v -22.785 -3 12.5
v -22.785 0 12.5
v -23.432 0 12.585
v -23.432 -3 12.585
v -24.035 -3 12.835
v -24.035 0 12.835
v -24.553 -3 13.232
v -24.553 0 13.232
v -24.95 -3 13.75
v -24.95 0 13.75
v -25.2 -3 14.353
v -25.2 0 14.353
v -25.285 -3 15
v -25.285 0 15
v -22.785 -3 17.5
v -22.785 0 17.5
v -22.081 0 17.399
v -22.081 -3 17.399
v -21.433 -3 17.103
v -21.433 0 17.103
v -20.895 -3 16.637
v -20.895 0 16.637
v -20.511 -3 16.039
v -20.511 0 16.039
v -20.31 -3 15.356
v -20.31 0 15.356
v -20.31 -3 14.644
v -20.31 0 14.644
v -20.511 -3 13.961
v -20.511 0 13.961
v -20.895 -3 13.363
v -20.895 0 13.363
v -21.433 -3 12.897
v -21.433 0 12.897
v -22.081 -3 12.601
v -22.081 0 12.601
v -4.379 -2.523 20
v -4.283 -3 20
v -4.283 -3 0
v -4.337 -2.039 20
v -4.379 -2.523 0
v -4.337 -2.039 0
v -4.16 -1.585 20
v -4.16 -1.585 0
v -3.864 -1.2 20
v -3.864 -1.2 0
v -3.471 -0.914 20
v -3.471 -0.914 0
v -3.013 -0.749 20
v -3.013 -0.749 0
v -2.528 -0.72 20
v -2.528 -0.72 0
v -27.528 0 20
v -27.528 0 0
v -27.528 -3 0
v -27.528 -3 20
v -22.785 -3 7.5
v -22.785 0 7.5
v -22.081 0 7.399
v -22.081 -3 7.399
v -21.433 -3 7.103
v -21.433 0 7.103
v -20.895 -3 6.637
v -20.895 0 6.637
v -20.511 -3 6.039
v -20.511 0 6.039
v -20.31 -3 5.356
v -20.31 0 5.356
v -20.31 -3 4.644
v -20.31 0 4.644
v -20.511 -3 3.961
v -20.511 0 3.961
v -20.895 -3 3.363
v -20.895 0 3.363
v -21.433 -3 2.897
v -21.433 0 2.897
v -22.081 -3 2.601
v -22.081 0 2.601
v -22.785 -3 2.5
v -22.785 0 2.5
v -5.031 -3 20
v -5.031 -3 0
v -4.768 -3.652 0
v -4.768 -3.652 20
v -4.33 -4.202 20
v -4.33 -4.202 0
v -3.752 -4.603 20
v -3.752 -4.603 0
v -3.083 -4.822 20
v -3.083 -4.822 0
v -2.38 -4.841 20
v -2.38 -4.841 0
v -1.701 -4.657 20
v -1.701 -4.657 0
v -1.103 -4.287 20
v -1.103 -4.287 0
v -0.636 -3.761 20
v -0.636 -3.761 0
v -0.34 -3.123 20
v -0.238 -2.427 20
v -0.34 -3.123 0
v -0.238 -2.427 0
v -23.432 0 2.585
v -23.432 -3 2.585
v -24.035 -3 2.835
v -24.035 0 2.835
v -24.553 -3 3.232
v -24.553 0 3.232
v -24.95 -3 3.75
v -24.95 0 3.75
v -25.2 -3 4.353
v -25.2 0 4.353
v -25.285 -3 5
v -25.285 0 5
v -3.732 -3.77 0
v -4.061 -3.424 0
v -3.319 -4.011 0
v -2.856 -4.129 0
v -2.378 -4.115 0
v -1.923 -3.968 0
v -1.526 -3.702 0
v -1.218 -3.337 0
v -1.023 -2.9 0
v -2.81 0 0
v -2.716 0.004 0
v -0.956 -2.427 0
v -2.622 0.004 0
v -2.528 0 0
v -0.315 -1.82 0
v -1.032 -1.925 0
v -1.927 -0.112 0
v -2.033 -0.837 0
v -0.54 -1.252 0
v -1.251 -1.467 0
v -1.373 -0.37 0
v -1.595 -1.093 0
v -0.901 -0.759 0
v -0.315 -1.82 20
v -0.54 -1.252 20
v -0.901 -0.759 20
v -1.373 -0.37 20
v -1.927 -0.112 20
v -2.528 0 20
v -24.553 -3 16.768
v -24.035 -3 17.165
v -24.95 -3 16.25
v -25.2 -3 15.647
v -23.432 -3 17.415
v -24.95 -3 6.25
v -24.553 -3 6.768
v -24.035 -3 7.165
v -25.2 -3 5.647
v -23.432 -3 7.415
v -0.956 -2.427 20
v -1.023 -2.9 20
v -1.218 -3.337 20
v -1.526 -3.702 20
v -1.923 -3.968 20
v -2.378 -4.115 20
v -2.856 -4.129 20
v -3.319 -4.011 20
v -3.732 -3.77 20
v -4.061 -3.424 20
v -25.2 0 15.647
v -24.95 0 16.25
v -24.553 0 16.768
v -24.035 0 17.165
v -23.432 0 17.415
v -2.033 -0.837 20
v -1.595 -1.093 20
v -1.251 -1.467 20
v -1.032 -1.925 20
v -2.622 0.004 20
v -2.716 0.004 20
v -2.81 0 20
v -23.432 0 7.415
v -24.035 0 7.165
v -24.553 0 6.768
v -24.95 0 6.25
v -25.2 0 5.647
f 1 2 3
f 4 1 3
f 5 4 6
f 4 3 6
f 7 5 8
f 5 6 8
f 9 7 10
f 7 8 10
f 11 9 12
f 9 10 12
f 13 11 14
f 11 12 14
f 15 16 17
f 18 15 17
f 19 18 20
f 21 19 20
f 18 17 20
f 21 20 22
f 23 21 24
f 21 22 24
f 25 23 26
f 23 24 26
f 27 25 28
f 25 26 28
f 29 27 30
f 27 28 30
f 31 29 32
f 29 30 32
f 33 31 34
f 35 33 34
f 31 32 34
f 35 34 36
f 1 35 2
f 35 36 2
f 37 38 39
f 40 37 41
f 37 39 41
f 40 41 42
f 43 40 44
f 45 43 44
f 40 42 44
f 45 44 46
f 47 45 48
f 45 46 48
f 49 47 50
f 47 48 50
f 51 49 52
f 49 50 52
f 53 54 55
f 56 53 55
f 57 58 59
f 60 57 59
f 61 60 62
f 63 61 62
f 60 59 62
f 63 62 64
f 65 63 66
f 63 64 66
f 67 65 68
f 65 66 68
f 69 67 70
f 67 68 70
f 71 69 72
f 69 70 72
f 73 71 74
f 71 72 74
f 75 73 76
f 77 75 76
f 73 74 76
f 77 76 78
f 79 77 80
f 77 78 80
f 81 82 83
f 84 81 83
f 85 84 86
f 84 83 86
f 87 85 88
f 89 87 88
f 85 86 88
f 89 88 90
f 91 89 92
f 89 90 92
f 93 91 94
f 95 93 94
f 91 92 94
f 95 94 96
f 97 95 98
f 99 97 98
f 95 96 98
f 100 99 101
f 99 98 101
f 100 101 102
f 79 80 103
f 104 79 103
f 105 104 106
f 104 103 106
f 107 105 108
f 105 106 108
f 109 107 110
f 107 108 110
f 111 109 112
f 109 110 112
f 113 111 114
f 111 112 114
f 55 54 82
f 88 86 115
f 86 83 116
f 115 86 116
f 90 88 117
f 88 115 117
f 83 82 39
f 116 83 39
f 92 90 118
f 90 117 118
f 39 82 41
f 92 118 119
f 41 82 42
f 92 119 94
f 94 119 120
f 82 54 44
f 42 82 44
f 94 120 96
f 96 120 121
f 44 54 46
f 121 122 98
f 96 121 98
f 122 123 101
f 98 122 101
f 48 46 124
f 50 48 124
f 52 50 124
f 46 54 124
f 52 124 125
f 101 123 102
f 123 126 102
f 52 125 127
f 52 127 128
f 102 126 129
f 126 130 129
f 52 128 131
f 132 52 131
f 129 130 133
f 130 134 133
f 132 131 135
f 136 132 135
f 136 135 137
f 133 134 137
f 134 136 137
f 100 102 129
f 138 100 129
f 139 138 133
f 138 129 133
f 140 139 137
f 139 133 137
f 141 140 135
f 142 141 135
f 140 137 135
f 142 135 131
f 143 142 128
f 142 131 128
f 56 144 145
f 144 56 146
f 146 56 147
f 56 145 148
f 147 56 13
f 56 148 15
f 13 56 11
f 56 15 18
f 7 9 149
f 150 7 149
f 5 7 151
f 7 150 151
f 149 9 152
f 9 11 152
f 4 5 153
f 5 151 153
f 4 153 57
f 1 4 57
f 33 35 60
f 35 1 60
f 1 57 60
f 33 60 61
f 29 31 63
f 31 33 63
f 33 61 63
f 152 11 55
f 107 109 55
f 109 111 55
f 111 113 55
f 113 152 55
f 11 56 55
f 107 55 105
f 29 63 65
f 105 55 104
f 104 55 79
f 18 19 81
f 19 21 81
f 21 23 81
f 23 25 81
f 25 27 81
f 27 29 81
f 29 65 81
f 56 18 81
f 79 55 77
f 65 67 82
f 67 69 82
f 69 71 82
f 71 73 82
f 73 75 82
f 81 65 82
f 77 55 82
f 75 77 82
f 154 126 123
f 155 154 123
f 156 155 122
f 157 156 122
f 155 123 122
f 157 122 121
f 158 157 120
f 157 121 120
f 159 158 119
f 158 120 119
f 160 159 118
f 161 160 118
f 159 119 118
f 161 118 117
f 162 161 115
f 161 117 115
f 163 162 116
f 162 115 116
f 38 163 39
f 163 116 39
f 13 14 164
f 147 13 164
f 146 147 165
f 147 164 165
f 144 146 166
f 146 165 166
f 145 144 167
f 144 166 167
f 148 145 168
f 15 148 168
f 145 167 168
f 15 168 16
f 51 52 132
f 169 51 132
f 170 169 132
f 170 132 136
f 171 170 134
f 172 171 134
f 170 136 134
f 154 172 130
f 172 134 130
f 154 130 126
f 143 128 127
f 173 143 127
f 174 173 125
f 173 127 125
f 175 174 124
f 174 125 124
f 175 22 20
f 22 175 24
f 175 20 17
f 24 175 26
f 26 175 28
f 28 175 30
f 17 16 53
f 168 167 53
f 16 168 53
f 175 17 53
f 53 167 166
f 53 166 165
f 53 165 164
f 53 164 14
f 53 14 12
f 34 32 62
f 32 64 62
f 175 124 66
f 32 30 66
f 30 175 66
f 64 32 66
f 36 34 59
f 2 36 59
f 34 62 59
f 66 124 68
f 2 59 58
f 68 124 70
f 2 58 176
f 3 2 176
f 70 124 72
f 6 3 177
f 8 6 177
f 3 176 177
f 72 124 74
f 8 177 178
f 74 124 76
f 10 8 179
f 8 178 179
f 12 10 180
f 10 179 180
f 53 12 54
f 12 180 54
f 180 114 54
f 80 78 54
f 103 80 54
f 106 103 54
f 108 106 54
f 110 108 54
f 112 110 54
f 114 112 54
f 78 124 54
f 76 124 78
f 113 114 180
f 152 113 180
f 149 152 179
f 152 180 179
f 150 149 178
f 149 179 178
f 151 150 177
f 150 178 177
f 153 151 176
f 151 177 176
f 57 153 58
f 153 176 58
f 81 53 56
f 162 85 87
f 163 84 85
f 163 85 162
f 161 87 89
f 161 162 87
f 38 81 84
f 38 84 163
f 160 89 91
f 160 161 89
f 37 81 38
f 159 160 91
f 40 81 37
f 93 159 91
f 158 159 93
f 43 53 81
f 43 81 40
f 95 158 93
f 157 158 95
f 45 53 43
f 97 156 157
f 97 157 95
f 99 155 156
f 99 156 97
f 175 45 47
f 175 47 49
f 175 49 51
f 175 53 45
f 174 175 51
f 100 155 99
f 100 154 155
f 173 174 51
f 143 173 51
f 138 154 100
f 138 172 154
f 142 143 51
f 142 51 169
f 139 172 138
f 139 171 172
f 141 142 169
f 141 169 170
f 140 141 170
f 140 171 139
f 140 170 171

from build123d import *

# Parameters (mm, degrees)
F1_DEPTH = 20
F3_DEPTH = 25
F4_DEPTH = 25


with BuildPart() as f1:
    # F0 (on Top) → F1 (new body)
    with BuildSketch(Plane.XY):
        with BuildLine():
            ThreePointArc((-2.5275626504, 0), (-2.6688577349, 0.0041097327), (-2.8101528193, 0))
            Line((-2.8101528193, 0), (-2.5275626504, 0))
        make_face()
        with BuildLine():
            ThreePointArc((-0.2378978583, -2.4268501438), (-0.900659697, -0.7586050718), (-2.5275626504, 0))
            Line((-2.5275626504, 0), (-2.5275626504, -0.7201090608))
            ThreePointArc((-2.5275626504, -0.7201090608), (-1.4089155682, -1.2669039546), (-0.9562779775, -2.4268501438))
            ThreePointArc((-0.9562779775, -2.4268501438), (-2.3780599484, -4.1145604485), (-4.2826819718, -3))
            Line((-4.2826819718, -3), (-5.0312855462, -3))
            ThreePointArc((-5.0312855462, -3), (-2.3802414664, -4.8406161994), (-0.2378978583, -2.4268501438))
        make_face()
        with BuildLine():
            Line((-2.5275626504, 0), (-2.8101528193, 0))
            ThreePointArc((-2.8101528193, 0), (-4.6226123471, -0.9803340406), (-5.0312855462, -3))
            Line((-5.0312855462, -3), (-4.2826819718, -3))
            ThreePointArc((-4.2826819718, -3), (-4.0258990754, -1.3821644373), (-2.5275626504, -0.7201090608))
            Line((-2.5275626504, -0.7201090608), (-2.5275626504, 0))
        make_face()
        with BuildLine():
            Line((-2.8101528193, 0), (-27.5275626504, 0))
            Line((-27.5275626504, 0), (-27.5275626504, -3))
            Line((-27.5275626504, -3), (-5.0312855462, -3))
            ThreePointArc((-5.0312855462, -3), (-4.6226123471, -0.9803340406), (-2.8101528193, 0))
        make_face()
    extrude(amount=F1_DEPTH)

    # F2 (on face) → F3 (cut)
    with BuildSketch(Plane(origin=(0, 0, 0), x_dir=(-1, 0, 0), z_dir=(0, 1, 0))):
        with BuildLine():
            Line((22.7848533541, 5), (22.7848533541, 2.5))
            ThreePointArc((22.7848533541, 2.5), (24.5526203071, 3.232233047), (25.2848533541, 5))
            ThreePointArc((25.2848533541, 5), (24.5526203071, 6.767766953), (22.7848533541, 7.5))
            Line((22.7848533541, 7.5), (22.7848533541, 5))
        make_face()
        with BuildLine():
            Line((22.7848533541, 15), (22.7848533541, 12.5))
            ThreePointArc((22.7848533541, 12.5), (24.5526203071, 13.232233047), (25.2848533541, 15))
            ThreePointArc((25.2848533541, 15), (24.5526203071, 16.767766953), (22.7848533541, 17.5))
            Line((22.7848533541, 17.5), (22.7848533541, 15))
        make_face()
        with BuildLine():
            ThreePointArc((22.7848533541, 17.5), (20.2848533541, 15), (22.7848533541, 12.5))
            Line((22.7848533541, 12.5), (22.7848533541, 15))
            Line((22.7848533541, 15), (22.7848533541, 17.5))
        make_face()
    extrude(amount=-F3_DEPTH, mode=Mode.SUBTRACT)

    # F2 (on face) → F4 (cut)
    with BuildSketch(Plane(origin=(0, 0, 0), x_dir=(-1, 0, 0), z_dir=(0, 1, 0))):
        with BuildLine():
            ThreePointArc((22.7848533541, 7.5), (20.2848533541, 5), (22.7848533541, 2.5))
            Line((22.7848533541, 2.5), (22.7848533541, 5))
            Line((22.7848533541, 5), (22.7848533541, 7.5))
        make_face()
    extrude(amount=-F4_DEPTH, mode=Mode.SUBTRACT)


solid = f1.part
